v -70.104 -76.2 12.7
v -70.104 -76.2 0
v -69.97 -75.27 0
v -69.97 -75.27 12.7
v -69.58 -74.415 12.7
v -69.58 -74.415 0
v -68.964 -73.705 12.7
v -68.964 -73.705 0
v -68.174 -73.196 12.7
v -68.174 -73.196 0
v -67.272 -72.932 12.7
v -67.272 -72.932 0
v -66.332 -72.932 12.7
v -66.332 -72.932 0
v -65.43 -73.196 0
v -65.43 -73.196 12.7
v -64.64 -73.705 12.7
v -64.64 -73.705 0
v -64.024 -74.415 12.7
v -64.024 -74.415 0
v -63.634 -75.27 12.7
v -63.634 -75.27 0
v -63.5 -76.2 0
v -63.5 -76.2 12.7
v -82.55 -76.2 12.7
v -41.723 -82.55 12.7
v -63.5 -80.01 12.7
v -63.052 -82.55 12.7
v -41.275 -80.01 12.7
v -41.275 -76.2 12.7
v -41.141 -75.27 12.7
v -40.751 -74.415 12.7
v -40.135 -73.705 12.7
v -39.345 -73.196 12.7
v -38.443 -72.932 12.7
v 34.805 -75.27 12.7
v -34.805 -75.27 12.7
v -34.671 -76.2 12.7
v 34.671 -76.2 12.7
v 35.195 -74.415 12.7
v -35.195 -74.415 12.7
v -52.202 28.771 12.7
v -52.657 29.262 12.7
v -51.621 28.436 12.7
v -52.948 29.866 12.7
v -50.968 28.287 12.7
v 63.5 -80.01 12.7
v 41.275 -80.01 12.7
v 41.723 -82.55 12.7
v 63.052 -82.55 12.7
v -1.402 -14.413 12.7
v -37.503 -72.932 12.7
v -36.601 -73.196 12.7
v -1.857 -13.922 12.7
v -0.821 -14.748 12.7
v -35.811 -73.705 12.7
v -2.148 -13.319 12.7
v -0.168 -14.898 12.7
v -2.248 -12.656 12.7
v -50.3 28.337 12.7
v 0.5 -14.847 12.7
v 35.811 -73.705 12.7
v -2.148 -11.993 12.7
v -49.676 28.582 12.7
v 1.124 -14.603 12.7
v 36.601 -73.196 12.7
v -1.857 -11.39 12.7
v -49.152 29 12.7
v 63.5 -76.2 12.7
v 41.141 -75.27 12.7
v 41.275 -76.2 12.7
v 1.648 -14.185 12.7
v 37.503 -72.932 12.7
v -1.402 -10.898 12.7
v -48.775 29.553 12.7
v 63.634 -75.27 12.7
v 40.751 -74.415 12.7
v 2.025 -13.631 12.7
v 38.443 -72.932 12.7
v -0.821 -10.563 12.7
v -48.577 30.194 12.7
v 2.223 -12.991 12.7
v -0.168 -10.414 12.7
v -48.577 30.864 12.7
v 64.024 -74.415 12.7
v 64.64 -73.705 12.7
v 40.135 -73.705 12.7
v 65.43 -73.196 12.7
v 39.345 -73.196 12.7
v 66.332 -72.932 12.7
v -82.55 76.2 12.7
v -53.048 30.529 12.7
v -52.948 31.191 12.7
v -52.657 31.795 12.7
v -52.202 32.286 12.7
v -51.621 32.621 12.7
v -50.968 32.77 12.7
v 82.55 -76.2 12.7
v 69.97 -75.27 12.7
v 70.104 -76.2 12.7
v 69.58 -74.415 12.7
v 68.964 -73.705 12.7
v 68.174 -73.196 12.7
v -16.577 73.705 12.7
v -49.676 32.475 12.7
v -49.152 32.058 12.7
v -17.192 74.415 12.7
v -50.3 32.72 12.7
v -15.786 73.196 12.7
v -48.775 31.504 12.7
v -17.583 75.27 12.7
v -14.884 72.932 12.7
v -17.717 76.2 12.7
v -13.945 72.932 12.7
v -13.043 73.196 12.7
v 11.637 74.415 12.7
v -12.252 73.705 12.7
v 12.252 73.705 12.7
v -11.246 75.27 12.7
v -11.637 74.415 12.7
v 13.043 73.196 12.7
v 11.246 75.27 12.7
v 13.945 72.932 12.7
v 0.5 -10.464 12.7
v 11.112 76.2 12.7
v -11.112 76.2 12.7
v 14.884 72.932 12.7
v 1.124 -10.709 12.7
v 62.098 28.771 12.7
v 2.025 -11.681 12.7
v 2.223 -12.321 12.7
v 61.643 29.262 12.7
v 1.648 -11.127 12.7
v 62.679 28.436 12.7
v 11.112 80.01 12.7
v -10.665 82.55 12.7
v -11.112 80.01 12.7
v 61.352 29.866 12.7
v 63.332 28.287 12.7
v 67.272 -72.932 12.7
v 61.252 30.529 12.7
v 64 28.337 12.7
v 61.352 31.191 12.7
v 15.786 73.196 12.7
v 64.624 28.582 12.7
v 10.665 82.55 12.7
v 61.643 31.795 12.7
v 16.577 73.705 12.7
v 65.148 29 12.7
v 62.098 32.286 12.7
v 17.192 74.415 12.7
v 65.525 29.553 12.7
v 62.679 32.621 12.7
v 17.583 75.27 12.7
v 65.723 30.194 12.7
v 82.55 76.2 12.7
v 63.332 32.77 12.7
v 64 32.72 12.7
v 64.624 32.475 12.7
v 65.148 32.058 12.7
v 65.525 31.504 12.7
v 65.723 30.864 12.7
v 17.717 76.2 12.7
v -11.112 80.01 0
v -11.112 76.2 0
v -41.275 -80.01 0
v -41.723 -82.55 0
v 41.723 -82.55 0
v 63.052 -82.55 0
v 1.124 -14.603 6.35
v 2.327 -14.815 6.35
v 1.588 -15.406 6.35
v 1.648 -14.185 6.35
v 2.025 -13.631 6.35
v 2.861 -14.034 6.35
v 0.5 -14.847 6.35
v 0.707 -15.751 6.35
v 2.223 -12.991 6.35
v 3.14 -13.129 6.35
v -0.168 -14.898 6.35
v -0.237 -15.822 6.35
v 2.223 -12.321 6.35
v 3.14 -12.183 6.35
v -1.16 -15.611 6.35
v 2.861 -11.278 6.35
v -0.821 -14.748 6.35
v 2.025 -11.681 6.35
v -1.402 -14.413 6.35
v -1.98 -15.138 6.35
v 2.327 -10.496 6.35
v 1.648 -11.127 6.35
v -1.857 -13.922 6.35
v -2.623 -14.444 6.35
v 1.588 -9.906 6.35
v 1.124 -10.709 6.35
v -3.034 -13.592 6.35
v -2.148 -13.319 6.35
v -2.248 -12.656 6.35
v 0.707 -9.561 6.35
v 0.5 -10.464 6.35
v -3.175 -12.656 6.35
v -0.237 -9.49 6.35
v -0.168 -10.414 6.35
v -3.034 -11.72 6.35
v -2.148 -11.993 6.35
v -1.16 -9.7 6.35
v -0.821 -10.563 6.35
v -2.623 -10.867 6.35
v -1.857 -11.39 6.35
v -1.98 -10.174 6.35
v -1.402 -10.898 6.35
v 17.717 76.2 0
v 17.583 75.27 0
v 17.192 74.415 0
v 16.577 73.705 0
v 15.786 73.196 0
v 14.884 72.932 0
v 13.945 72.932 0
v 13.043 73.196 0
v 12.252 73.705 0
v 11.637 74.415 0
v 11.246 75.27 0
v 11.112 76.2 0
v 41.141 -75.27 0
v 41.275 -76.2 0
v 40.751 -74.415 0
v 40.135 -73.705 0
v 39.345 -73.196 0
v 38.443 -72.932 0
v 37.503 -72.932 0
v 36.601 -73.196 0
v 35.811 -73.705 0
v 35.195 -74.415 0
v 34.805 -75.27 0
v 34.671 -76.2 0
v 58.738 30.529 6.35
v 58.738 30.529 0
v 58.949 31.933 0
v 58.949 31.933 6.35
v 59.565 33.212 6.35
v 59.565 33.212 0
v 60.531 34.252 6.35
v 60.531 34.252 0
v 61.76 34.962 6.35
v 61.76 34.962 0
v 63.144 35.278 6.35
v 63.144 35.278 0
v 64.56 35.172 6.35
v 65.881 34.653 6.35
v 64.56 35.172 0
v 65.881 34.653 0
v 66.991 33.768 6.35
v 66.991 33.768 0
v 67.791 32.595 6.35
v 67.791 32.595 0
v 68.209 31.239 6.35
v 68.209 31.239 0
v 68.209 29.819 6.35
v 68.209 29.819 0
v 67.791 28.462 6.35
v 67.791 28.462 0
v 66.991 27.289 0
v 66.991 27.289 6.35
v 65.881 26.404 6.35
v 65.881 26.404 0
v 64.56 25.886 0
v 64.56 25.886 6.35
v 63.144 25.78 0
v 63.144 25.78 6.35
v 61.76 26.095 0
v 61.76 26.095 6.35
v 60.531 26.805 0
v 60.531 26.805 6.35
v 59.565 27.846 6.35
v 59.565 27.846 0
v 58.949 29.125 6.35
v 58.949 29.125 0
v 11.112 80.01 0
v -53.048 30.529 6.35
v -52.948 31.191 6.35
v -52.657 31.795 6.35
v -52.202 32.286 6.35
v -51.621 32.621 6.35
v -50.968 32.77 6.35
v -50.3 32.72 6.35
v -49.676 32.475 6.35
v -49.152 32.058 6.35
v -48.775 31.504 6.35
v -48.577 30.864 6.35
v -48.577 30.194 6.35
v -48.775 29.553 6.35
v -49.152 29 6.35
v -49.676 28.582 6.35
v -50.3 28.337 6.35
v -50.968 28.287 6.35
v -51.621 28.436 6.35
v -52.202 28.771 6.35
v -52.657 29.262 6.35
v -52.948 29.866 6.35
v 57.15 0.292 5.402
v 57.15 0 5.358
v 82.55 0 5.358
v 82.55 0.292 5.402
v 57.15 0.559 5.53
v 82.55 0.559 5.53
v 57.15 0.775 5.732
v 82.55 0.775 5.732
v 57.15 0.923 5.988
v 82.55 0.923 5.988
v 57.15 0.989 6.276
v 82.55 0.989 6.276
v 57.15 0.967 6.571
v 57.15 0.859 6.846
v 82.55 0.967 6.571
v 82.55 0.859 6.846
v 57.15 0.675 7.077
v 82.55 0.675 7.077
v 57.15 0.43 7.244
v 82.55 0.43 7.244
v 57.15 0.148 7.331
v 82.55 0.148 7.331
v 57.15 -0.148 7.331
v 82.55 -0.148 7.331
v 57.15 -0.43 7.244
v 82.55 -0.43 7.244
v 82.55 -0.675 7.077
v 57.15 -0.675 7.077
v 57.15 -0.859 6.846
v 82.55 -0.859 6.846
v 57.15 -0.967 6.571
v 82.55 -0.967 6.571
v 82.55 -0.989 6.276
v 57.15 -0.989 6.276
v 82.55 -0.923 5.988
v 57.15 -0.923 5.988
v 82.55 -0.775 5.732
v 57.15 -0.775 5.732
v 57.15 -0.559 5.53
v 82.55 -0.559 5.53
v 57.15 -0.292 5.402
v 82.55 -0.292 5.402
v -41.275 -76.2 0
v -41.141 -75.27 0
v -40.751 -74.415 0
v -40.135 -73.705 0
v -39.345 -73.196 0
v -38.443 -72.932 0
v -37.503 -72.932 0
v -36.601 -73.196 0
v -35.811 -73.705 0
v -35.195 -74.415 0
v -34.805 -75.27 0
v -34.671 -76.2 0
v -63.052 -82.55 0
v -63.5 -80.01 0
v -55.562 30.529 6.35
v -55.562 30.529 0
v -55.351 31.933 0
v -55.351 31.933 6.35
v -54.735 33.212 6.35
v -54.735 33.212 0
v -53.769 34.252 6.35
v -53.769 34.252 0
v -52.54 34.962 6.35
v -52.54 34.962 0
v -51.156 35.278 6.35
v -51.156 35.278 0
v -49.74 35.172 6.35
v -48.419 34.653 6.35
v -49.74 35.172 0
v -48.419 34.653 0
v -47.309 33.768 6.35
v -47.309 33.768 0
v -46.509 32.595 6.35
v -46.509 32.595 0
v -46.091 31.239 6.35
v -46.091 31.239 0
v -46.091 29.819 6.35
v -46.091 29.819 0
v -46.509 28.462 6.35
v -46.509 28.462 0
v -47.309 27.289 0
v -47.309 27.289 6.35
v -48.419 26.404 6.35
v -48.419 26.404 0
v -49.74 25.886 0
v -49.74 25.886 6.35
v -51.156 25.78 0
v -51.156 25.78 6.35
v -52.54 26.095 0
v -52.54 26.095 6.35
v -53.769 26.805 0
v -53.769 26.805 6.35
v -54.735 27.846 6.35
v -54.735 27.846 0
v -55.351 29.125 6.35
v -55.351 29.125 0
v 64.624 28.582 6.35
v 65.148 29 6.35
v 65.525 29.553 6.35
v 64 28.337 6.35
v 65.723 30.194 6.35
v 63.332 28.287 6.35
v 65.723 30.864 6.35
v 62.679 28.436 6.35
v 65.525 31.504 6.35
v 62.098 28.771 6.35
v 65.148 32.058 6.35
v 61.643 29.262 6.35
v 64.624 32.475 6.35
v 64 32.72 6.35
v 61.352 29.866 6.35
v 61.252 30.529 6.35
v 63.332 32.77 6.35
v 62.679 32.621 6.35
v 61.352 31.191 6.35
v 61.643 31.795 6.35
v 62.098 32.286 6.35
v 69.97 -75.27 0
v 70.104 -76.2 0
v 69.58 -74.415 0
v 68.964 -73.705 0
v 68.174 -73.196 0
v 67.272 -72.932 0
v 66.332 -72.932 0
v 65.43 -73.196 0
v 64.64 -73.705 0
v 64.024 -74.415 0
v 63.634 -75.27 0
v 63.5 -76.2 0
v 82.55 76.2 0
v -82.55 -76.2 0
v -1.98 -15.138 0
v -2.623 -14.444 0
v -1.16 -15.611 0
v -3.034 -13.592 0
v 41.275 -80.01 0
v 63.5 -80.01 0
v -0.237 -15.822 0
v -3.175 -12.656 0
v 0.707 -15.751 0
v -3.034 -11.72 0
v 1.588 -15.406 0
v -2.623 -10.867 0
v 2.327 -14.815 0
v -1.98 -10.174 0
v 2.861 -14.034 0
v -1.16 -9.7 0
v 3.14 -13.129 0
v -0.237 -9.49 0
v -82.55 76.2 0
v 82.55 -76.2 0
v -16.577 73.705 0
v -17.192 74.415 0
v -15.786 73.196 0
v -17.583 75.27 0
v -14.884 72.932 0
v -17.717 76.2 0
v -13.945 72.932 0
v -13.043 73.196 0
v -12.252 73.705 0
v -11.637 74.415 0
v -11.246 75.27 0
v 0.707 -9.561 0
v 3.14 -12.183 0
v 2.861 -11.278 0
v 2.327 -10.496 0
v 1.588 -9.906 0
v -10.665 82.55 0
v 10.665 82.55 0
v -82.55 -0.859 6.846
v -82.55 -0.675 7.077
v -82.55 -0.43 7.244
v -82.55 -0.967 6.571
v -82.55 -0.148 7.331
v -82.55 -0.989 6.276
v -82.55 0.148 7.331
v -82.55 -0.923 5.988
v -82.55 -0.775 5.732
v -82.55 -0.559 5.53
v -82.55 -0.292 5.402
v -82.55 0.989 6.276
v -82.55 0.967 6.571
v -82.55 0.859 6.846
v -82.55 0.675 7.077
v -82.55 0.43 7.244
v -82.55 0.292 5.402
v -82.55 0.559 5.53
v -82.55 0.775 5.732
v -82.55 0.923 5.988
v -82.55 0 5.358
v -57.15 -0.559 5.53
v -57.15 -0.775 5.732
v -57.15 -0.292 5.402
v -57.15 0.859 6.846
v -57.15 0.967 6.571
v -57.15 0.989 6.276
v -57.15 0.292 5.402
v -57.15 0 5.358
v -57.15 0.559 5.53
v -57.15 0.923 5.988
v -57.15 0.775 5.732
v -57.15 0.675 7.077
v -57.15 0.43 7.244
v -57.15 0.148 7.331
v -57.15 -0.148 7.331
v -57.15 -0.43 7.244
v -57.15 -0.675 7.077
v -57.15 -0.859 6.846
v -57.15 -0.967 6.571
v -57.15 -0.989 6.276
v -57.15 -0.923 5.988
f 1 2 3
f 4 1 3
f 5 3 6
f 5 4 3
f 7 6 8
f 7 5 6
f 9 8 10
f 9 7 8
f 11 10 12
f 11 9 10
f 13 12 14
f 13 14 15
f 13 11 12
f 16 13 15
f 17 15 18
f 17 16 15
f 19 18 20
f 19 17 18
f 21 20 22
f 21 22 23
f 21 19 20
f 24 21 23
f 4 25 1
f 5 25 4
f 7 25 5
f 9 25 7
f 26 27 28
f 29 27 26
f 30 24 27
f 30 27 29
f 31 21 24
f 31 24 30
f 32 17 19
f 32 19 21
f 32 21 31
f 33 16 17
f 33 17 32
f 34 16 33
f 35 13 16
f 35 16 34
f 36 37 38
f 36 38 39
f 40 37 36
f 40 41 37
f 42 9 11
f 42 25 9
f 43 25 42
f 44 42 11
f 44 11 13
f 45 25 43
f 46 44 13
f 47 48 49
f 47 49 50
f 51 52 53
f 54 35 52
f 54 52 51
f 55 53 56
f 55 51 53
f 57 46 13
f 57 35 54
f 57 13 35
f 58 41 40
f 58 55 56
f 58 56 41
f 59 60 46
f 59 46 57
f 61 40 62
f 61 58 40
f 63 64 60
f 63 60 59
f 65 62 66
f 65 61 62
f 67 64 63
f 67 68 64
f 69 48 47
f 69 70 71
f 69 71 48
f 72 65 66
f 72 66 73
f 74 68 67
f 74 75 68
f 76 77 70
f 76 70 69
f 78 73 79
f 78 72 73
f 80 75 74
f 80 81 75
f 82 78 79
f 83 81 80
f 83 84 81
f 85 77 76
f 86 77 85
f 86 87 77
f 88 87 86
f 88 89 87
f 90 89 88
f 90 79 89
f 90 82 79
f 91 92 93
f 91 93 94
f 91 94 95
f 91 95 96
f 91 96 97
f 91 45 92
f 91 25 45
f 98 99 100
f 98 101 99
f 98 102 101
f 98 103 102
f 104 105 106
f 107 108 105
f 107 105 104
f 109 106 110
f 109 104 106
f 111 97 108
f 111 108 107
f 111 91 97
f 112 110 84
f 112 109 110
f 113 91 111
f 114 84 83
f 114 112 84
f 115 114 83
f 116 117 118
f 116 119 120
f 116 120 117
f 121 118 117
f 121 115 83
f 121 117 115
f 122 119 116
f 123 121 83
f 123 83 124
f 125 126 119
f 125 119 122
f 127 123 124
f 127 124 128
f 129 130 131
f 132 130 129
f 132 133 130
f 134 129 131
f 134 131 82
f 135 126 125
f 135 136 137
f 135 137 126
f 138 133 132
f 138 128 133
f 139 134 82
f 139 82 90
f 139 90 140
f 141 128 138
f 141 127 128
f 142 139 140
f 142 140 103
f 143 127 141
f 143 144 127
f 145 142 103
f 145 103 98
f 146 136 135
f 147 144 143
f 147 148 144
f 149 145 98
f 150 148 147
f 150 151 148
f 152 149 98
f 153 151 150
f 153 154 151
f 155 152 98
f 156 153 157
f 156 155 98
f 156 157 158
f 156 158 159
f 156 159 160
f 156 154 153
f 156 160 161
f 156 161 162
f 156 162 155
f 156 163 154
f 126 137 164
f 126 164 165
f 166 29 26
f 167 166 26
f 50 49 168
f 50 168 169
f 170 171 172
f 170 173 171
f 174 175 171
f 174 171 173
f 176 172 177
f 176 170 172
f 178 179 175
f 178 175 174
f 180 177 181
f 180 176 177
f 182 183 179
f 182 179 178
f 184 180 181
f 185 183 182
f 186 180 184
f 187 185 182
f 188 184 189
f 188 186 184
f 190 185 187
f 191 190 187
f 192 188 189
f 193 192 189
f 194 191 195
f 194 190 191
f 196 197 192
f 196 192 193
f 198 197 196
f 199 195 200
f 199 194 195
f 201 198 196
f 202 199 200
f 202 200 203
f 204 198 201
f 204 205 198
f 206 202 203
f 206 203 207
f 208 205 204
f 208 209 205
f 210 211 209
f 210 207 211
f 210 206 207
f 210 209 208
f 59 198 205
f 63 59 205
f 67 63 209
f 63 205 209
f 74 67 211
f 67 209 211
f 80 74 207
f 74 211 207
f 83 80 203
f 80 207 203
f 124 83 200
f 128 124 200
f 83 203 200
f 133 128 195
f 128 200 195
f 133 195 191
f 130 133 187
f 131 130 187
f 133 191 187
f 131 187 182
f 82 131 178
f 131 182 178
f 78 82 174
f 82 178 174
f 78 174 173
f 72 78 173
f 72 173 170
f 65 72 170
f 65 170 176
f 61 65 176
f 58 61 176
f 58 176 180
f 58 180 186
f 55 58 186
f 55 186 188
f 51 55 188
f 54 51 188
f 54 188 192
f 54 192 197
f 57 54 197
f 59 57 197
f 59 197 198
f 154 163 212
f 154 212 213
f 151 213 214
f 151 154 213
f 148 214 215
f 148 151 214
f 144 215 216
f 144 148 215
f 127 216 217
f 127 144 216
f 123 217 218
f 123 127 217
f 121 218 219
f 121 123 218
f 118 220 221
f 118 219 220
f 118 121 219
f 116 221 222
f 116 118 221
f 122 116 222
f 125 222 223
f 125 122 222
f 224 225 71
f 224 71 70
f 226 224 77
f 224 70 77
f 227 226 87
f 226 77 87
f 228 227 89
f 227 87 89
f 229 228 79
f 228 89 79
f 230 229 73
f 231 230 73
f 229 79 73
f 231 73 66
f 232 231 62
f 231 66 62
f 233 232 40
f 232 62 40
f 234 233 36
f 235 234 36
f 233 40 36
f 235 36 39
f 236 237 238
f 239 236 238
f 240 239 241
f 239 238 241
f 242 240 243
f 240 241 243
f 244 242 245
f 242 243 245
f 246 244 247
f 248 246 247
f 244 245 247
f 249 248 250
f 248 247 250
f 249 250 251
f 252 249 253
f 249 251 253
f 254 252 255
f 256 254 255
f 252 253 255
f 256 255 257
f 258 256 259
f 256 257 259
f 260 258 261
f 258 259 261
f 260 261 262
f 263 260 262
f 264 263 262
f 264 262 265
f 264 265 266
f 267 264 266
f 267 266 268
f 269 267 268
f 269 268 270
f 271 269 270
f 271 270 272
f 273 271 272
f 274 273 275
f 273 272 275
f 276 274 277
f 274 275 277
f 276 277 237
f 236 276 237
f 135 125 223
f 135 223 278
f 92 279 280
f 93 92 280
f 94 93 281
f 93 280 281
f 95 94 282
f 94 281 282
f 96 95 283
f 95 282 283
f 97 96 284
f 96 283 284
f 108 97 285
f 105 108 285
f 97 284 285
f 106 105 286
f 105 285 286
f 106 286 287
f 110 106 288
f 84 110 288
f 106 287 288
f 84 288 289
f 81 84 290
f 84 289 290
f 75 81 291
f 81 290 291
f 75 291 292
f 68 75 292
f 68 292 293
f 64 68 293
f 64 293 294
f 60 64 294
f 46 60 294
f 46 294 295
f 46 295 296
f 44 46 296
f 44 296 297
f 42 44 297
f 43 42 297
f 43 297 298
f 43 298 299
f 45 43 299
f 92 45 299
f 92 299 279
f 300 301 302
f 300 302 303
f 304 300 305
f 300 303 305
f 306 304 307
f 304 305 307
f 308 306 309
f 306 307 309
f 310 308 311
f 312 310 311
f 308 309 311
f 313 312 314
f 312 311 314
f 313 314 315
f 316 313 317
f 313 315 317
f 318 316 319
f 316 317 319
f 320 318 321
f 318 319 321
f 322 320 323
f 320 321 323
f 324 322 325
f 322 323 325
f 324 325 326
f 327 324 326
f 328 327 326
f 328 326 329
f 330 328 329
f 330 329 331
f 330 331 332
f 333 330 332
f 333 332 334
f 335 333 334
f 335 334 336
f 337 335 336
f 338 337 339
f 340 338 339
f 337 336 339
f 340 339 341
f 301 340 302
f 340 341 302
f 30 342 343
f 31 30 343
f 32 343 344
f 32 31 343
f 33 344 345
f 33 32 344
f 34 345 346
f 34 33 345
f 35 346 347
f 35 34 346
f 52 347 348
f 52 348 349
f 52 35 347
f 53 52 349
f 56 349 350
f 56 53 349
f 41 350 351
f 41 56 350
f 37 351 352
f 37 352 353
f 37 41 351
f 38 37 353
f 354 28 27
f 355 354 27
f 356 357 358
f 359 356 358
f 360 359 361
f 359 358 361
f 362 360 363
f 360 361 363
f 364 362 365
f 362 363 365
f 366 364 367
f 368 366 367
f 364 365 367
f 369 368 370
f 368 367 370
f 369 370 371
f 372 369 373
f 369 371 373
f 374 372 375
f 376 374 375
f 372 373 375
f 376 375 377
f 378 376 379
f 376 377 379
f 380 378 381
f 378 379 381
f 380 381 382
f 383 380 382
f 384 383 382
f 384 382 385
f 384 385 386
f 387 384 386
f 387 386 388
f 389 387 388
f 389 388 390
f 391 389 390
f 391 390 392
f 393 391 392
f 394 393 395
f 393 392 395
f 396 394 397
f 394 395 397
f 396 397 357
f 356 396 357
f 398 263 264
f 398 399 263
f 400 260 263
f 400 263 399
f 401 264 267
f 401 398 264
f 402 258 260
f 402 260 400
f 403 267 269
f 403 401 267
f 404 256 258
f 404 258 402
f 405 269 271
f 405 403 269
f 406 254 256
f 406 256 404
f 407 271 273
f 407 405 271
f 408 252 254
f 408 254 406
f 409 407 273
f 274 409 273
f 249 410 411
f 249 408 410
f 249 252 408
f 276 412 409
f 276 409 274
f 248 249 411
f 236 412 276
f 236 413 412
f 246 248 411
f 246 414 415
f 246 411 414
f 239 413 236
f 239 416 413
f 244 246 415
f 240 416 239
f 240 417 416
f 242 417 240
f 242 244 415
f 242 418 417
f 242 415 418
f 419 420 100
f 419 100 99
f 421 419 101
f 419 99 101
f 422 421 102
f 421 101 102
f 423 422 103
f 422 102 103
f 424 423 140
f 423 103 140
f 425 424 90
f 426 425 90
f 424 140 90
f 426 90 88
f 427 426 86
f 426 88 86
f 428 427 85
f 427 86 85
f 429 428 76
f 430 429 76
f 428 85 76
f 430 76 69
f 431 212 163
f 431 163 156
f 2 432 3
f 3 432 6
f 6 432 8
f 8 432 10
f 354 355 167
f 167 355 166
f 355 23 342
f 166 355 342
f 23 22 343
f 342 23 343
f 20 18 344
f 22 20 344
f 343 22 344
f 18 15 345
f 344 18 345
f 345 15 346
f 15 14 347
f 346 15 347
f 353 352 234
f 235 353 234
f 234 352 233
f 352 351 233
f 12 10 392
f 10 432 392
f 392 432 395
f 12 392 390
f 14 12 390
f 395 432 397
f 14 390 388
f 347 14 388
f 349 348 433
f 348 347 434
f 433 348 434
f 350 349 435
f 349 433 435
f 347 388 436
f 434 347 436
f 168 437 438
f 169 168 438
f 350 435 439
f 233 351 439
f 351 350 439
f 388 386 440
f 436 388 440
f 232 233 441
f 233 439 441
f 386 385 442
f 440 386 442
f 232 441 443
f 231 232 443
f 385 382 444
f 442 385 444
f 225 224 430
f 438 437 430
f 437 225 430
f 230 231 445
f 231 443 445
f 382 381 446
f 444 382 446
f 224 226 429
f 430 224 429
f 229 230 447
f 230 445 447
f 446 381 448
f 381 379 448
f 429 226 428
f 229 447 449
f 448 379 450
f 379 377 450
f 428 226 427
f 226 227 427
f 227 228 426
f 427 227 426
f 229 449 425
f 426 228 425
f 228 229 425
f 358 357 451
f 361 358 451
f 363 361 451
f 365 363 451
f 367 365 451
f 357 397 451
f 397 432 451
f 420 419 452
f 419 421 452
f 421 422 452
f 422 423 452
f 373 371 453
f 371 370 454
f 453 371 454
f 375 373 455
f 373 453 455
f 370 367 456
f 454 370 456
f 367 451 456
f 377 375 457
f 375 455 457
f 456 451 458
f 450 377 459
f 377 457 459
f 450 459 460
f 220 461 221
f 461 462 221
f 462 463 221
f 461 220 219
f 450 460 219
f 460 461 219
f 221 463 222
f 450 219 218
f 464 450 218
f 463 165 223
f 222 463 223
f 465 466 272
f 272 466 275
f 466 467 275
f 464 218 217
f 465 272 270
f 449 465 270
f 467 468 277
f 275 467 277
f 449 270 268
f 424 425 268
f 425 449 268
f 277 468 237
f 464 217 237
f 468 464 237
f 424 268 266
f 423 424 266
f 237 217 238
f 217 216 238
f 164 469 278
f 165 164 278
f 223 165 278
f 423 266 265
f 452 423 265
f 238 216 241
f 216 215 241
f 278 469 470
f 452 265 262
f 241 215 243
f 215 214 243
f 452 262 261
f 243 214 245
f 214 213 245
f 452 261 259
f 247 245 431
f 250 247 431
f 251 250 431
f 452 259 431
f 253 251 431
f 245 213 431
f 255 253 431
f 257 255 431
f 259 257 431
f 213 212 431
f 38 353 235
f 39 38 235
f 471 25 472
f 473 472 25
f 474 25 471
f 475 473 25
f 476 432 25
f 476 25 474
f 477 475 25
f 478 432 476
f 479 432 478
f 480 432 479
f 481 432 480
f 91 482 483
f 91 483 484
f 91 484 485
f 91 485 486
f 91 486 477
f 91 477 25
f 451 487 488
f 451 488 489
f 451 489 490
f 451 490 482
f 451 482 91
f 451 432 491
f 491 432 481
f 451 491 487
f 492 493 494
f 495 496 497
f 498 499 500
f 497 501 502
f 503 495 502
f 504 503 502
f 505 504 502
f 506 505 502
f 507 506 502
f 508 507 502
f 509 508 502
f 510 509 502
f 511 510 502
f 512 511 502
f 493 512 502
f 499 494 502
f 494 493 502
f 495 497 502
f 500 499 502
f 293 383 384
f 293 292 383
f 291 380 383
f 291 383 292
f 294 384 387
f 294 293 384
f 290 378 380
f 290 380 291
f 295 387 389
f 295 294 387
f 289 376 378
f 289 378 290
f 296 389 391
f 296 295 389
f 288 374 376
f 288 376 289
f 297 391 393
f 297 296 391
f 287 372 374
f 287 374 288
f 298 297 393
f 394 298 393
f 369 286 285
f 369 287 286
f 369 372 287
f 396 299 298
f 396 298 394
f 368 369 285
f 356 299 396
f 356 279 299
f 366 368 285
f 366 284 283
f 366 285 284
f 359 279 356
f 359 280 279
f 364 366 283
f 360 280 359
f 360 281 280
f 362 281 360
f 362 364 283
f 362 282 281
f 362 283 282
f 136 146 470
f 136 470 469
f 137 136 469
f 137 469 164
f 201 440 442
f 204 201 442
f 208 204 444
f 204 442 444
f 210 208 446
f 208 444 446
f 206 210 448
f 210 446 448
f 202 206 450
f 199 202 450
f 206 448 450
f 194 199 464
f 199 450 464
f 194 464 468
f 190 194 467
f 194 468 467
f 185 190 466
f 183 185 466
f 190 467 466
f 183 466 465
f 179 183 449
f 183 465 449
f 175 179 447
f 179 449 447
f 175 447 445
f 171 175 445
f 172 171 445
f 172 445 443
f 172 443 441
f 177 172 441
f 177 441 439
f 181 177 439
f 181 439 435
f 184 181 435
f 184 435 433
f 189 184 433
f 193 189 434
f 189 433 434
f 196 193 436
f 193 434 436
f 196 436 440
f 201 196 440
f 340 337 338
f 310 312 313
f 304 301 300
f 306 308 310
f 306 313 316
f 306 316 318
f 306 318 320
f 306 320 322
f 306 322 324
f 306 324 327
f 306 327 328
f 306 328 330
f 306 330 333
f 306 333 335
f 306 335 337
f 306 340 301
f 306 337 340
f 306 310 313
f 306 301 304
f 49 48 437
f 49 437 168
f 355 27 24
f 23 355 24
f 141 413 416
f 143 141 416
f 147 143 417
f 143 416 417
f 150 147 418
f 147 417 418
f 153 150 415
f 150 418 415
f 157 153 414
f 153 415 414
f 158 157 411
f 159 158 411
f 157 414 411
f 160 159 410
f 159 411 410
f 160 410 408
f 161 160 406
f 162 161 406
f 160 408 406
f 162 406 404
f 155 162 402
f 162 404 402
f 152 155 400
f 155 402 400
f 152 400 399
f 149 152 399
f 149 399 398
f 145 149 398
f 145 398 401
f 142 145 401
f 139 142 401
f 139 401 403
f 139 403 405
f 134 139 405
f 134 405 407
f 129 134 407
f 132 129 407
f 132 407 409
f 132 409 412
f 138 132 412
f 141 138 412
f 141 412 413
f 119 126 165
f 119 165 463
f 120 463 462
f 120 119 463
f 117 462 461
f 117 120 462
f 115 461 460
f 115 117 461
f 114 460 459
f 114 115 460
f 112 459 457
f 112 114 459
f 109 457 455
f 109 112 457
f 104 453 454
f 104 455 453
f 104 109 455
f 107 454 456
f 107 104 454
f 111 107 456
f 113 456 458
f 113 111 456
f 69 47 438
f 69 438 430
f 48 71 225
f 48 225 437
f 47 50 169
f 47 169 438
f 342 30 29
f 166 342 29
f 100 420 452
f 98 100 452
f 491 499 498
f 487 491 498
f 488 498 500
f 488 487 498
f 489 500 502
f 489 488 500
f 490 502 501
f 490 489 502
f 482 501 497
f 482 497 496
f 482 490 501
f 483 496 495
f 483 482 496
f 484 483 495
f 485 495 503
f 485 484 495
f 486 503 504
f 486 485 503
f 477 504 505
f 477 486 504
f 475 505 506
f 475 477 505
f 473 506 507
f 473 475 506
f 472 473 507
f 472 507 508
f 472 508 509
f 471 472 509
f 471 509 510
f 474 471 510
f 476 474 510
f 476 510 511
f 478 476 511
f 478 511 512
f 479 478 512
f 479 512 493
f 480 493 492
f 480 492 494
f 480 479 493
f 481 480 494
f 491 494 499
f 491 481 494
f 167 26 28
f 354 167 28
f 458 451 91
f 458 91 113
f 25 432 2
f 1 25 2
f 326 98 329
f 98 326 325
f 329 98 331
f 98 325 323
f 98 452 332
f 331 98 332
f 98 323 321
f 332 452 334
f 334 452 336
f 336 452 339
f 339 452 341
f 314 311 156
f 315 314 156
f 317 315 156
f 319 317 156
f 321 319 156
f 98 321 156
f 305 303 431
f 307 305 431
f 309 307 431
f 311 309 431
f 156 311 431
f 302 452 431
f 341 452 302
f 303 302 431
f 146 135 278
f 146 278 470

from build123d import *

# Parameters (mm, degrees)
SKETCH1_W             = 165.1
SKETCH1_H             = 152.4
BOSS_EXTRUDE1_DEPTH   = 12.7
BOSS_EXTRUDE2_DEPTH   = 12.7
CUT_EXTRUDE1_REACH    = 119.432
BOSS_EXTRUDE3_DEPTH   = 12.7
CUT_EXTRUDE2_DEPTH    = 12.7
F_8_CLEARANCE_HOLE1_D = 4.4958
SKETCH20_R            = 0.99187
CUT_EXTRUDE9_DEPTH    = 25.4
SKETCH21_R            = 3.175
SKETCH21_R_2          = 4.7625
CUT_EXTRUDE10_DEPTH   = 6.35


with BuildPart() as part:
    # Sketch1 → Boss-Extrude1 (new body)
    with BuildSketch(Plane.XY):
        Rectangle(SKETCH1_W, SKETCH1_H)
    extrude(amount=BOSS_EXTRUDE1_DEPTH)

    # Sketch2 → Boss-Extrude2 (add)
    with BuildSketch(Plane.XY.offset(12.7)):
        Polygon((-11.1125, 76.2), (11.1125, 76.2), (11.1125, 80.01), (10.664629469, 82.55), (-10.664629469, 82.55), (-11.1125, 80.01), align=None)
    extrude(amount=-BOSS_EXTRUDE2_DEPTH)

    # Sketch4 → Cut-Extrude1 (cut, up to next)
    with BuildSketch(Plane.XY.offset(12.7), mode=Mode.PRIVATE) as cut_extrude1_sk1:
        with BuildLine():
            Line((-17.7165, 76.2), (-11.1125, 76.2))
            ThreePointArc((-11.1125, 76.2), (-14.4145, 72.898), (-17.7165, 76.2))
        make_face()
    cut_extrude1_tool1 = extrude(cut_extrude1_sk1.sketch, amount=-CUT_EXTRUDE1_REACH, mode=Mode.PRIVATE) & part.part
    # Sketch4 → Cut-Extrude1 (cut, up to next)
    with BuildSketch(Plane.XY.offset(12.7), mode=Mode.PRIVATE) as cut_extrude1_sk2:
        with BuildLine():
            Line((11.1125, 76.2), (17.7165, 76.2))
            ThreePointArc((17.7165, 76.2), (14.4145, 72.898), (11.1125, 76.2))
        make_face()
    cut_extrude1_tool2 = extrude(cut_extrude1_sk2.sketch, amount=-CUT_EXTRUDE1_REACH, mode=Mode.PRIVATE) & part.part
    add(cut_extrude1_tool1.solids().sort_by_distance((-14.4145, 74.798588, 12.7))[0], mode=Mode.SUBTRACT)
    add(cut_extrude1_tool2.solids().sort_by_distance((14.4145, 74.798588, 12.7))[0], mode=Mode.SUBTRACT)

    # Sketch5 → Boss-Extrude3 (add)
    with BuildSketch(Plane.XY.offset(12.7)):
        Polygon((63.5, -76.2), (41.275, -76.2), (41.275, -80.01), (41.722870531, -82.55), (63.052129469, -82.55), (63.5, -80.01), align=None)
    boss_extrude3 = extrude(amount=-BOSS_EXTRUDE3_DEPTH)

    # Sketch6 → Cut-Extrude2 (cut)
    with BuildSketch(Plane.XY.offset(12.7)):
        with BuildLine():
            Line((34.671, -76.2), (41.275, -76.2))
            ThreePointArc((41.275, -76.2), (37.973, -72.898), (34.671, -76.2))
        make_face()
        with BuildLine():
            Line((63.5, -76.2), (70.104, -76.2))
            ThreePointArc((70.104, -76.2), (66.802, -72.898), (63.5, -76.2))
        make_face()
    cut_extrude2 = extrude(amount=-CUT_EXTRUDE2_DEPTH, mode=Mode.SUBTRACT)

    # Mirror1: Boss-Extrude3, Cut-Extrude2 across plane
    add(boss_extrude3.mirror(Plane(origin=(0, 0, 0), x_dir=(0, 0, 1), z_dir=(1, 0, 0))))
    add(cut_extrude2.mirror(Plane(origin=(0, 0, 0), x_dir=(0, 0, 1), z_dir=(1, 0, 0))), mode=Mode.SUBTRACT)

    # #8 Clearance Hole1 (through all)
    with Locations(Plane.XY.offset(12.7)):
        with Locations((0, -12.655936751), (63.5, 30.528732114), (-50.8, 30.528732114)):
            Hole(F_8_CLEARANCE_HOLE1_D / 2)

    # Sketch20 → Cut-Extrude9 (cut)
    with BuildSketch(Plane(origin=(82.55, 0, 0), x_dir=(0, 0, -1), z_dir=(1, 0, 0))):
        with Locations((-6.35, 0)):
            Circle(SKETCH20_R)
    cut_extrude9 = extrude(amount=-CUT_EXTRUDE9_DEPTH, mode=Mode.SUBTRACT)

    # Mirror3: Cut-Extrude9 across plane
    add(cut_extrude9.mirror(Plane(origin=(0, 0, 0), x_dir=(0, 0, 1), z_dir=(1, 0, 0))), mode=Mode.SUBTRACT)

    # Sketch21 → Cut-Extrude10 (cut)
    with BuildSketch(Plane(origin=(0, 0, 0), x_dir=(-1, 0, 0), z_dir=(0, 0, -1))):
        with Locations((0, -12.655936751)):
            Circle(SKETCH21_R)
        with Locations((-63.5, 30.528732114)):
            Circle(SKETCH21_R_2)
        with Locations((50.8, 30.528732114)):
            Circle(SKETCH21_R_2)
    extrude(amount=-CUT_EXTRUDE10_DEPTH, mode=Mode.SUBTRACT)


solid = part.part
